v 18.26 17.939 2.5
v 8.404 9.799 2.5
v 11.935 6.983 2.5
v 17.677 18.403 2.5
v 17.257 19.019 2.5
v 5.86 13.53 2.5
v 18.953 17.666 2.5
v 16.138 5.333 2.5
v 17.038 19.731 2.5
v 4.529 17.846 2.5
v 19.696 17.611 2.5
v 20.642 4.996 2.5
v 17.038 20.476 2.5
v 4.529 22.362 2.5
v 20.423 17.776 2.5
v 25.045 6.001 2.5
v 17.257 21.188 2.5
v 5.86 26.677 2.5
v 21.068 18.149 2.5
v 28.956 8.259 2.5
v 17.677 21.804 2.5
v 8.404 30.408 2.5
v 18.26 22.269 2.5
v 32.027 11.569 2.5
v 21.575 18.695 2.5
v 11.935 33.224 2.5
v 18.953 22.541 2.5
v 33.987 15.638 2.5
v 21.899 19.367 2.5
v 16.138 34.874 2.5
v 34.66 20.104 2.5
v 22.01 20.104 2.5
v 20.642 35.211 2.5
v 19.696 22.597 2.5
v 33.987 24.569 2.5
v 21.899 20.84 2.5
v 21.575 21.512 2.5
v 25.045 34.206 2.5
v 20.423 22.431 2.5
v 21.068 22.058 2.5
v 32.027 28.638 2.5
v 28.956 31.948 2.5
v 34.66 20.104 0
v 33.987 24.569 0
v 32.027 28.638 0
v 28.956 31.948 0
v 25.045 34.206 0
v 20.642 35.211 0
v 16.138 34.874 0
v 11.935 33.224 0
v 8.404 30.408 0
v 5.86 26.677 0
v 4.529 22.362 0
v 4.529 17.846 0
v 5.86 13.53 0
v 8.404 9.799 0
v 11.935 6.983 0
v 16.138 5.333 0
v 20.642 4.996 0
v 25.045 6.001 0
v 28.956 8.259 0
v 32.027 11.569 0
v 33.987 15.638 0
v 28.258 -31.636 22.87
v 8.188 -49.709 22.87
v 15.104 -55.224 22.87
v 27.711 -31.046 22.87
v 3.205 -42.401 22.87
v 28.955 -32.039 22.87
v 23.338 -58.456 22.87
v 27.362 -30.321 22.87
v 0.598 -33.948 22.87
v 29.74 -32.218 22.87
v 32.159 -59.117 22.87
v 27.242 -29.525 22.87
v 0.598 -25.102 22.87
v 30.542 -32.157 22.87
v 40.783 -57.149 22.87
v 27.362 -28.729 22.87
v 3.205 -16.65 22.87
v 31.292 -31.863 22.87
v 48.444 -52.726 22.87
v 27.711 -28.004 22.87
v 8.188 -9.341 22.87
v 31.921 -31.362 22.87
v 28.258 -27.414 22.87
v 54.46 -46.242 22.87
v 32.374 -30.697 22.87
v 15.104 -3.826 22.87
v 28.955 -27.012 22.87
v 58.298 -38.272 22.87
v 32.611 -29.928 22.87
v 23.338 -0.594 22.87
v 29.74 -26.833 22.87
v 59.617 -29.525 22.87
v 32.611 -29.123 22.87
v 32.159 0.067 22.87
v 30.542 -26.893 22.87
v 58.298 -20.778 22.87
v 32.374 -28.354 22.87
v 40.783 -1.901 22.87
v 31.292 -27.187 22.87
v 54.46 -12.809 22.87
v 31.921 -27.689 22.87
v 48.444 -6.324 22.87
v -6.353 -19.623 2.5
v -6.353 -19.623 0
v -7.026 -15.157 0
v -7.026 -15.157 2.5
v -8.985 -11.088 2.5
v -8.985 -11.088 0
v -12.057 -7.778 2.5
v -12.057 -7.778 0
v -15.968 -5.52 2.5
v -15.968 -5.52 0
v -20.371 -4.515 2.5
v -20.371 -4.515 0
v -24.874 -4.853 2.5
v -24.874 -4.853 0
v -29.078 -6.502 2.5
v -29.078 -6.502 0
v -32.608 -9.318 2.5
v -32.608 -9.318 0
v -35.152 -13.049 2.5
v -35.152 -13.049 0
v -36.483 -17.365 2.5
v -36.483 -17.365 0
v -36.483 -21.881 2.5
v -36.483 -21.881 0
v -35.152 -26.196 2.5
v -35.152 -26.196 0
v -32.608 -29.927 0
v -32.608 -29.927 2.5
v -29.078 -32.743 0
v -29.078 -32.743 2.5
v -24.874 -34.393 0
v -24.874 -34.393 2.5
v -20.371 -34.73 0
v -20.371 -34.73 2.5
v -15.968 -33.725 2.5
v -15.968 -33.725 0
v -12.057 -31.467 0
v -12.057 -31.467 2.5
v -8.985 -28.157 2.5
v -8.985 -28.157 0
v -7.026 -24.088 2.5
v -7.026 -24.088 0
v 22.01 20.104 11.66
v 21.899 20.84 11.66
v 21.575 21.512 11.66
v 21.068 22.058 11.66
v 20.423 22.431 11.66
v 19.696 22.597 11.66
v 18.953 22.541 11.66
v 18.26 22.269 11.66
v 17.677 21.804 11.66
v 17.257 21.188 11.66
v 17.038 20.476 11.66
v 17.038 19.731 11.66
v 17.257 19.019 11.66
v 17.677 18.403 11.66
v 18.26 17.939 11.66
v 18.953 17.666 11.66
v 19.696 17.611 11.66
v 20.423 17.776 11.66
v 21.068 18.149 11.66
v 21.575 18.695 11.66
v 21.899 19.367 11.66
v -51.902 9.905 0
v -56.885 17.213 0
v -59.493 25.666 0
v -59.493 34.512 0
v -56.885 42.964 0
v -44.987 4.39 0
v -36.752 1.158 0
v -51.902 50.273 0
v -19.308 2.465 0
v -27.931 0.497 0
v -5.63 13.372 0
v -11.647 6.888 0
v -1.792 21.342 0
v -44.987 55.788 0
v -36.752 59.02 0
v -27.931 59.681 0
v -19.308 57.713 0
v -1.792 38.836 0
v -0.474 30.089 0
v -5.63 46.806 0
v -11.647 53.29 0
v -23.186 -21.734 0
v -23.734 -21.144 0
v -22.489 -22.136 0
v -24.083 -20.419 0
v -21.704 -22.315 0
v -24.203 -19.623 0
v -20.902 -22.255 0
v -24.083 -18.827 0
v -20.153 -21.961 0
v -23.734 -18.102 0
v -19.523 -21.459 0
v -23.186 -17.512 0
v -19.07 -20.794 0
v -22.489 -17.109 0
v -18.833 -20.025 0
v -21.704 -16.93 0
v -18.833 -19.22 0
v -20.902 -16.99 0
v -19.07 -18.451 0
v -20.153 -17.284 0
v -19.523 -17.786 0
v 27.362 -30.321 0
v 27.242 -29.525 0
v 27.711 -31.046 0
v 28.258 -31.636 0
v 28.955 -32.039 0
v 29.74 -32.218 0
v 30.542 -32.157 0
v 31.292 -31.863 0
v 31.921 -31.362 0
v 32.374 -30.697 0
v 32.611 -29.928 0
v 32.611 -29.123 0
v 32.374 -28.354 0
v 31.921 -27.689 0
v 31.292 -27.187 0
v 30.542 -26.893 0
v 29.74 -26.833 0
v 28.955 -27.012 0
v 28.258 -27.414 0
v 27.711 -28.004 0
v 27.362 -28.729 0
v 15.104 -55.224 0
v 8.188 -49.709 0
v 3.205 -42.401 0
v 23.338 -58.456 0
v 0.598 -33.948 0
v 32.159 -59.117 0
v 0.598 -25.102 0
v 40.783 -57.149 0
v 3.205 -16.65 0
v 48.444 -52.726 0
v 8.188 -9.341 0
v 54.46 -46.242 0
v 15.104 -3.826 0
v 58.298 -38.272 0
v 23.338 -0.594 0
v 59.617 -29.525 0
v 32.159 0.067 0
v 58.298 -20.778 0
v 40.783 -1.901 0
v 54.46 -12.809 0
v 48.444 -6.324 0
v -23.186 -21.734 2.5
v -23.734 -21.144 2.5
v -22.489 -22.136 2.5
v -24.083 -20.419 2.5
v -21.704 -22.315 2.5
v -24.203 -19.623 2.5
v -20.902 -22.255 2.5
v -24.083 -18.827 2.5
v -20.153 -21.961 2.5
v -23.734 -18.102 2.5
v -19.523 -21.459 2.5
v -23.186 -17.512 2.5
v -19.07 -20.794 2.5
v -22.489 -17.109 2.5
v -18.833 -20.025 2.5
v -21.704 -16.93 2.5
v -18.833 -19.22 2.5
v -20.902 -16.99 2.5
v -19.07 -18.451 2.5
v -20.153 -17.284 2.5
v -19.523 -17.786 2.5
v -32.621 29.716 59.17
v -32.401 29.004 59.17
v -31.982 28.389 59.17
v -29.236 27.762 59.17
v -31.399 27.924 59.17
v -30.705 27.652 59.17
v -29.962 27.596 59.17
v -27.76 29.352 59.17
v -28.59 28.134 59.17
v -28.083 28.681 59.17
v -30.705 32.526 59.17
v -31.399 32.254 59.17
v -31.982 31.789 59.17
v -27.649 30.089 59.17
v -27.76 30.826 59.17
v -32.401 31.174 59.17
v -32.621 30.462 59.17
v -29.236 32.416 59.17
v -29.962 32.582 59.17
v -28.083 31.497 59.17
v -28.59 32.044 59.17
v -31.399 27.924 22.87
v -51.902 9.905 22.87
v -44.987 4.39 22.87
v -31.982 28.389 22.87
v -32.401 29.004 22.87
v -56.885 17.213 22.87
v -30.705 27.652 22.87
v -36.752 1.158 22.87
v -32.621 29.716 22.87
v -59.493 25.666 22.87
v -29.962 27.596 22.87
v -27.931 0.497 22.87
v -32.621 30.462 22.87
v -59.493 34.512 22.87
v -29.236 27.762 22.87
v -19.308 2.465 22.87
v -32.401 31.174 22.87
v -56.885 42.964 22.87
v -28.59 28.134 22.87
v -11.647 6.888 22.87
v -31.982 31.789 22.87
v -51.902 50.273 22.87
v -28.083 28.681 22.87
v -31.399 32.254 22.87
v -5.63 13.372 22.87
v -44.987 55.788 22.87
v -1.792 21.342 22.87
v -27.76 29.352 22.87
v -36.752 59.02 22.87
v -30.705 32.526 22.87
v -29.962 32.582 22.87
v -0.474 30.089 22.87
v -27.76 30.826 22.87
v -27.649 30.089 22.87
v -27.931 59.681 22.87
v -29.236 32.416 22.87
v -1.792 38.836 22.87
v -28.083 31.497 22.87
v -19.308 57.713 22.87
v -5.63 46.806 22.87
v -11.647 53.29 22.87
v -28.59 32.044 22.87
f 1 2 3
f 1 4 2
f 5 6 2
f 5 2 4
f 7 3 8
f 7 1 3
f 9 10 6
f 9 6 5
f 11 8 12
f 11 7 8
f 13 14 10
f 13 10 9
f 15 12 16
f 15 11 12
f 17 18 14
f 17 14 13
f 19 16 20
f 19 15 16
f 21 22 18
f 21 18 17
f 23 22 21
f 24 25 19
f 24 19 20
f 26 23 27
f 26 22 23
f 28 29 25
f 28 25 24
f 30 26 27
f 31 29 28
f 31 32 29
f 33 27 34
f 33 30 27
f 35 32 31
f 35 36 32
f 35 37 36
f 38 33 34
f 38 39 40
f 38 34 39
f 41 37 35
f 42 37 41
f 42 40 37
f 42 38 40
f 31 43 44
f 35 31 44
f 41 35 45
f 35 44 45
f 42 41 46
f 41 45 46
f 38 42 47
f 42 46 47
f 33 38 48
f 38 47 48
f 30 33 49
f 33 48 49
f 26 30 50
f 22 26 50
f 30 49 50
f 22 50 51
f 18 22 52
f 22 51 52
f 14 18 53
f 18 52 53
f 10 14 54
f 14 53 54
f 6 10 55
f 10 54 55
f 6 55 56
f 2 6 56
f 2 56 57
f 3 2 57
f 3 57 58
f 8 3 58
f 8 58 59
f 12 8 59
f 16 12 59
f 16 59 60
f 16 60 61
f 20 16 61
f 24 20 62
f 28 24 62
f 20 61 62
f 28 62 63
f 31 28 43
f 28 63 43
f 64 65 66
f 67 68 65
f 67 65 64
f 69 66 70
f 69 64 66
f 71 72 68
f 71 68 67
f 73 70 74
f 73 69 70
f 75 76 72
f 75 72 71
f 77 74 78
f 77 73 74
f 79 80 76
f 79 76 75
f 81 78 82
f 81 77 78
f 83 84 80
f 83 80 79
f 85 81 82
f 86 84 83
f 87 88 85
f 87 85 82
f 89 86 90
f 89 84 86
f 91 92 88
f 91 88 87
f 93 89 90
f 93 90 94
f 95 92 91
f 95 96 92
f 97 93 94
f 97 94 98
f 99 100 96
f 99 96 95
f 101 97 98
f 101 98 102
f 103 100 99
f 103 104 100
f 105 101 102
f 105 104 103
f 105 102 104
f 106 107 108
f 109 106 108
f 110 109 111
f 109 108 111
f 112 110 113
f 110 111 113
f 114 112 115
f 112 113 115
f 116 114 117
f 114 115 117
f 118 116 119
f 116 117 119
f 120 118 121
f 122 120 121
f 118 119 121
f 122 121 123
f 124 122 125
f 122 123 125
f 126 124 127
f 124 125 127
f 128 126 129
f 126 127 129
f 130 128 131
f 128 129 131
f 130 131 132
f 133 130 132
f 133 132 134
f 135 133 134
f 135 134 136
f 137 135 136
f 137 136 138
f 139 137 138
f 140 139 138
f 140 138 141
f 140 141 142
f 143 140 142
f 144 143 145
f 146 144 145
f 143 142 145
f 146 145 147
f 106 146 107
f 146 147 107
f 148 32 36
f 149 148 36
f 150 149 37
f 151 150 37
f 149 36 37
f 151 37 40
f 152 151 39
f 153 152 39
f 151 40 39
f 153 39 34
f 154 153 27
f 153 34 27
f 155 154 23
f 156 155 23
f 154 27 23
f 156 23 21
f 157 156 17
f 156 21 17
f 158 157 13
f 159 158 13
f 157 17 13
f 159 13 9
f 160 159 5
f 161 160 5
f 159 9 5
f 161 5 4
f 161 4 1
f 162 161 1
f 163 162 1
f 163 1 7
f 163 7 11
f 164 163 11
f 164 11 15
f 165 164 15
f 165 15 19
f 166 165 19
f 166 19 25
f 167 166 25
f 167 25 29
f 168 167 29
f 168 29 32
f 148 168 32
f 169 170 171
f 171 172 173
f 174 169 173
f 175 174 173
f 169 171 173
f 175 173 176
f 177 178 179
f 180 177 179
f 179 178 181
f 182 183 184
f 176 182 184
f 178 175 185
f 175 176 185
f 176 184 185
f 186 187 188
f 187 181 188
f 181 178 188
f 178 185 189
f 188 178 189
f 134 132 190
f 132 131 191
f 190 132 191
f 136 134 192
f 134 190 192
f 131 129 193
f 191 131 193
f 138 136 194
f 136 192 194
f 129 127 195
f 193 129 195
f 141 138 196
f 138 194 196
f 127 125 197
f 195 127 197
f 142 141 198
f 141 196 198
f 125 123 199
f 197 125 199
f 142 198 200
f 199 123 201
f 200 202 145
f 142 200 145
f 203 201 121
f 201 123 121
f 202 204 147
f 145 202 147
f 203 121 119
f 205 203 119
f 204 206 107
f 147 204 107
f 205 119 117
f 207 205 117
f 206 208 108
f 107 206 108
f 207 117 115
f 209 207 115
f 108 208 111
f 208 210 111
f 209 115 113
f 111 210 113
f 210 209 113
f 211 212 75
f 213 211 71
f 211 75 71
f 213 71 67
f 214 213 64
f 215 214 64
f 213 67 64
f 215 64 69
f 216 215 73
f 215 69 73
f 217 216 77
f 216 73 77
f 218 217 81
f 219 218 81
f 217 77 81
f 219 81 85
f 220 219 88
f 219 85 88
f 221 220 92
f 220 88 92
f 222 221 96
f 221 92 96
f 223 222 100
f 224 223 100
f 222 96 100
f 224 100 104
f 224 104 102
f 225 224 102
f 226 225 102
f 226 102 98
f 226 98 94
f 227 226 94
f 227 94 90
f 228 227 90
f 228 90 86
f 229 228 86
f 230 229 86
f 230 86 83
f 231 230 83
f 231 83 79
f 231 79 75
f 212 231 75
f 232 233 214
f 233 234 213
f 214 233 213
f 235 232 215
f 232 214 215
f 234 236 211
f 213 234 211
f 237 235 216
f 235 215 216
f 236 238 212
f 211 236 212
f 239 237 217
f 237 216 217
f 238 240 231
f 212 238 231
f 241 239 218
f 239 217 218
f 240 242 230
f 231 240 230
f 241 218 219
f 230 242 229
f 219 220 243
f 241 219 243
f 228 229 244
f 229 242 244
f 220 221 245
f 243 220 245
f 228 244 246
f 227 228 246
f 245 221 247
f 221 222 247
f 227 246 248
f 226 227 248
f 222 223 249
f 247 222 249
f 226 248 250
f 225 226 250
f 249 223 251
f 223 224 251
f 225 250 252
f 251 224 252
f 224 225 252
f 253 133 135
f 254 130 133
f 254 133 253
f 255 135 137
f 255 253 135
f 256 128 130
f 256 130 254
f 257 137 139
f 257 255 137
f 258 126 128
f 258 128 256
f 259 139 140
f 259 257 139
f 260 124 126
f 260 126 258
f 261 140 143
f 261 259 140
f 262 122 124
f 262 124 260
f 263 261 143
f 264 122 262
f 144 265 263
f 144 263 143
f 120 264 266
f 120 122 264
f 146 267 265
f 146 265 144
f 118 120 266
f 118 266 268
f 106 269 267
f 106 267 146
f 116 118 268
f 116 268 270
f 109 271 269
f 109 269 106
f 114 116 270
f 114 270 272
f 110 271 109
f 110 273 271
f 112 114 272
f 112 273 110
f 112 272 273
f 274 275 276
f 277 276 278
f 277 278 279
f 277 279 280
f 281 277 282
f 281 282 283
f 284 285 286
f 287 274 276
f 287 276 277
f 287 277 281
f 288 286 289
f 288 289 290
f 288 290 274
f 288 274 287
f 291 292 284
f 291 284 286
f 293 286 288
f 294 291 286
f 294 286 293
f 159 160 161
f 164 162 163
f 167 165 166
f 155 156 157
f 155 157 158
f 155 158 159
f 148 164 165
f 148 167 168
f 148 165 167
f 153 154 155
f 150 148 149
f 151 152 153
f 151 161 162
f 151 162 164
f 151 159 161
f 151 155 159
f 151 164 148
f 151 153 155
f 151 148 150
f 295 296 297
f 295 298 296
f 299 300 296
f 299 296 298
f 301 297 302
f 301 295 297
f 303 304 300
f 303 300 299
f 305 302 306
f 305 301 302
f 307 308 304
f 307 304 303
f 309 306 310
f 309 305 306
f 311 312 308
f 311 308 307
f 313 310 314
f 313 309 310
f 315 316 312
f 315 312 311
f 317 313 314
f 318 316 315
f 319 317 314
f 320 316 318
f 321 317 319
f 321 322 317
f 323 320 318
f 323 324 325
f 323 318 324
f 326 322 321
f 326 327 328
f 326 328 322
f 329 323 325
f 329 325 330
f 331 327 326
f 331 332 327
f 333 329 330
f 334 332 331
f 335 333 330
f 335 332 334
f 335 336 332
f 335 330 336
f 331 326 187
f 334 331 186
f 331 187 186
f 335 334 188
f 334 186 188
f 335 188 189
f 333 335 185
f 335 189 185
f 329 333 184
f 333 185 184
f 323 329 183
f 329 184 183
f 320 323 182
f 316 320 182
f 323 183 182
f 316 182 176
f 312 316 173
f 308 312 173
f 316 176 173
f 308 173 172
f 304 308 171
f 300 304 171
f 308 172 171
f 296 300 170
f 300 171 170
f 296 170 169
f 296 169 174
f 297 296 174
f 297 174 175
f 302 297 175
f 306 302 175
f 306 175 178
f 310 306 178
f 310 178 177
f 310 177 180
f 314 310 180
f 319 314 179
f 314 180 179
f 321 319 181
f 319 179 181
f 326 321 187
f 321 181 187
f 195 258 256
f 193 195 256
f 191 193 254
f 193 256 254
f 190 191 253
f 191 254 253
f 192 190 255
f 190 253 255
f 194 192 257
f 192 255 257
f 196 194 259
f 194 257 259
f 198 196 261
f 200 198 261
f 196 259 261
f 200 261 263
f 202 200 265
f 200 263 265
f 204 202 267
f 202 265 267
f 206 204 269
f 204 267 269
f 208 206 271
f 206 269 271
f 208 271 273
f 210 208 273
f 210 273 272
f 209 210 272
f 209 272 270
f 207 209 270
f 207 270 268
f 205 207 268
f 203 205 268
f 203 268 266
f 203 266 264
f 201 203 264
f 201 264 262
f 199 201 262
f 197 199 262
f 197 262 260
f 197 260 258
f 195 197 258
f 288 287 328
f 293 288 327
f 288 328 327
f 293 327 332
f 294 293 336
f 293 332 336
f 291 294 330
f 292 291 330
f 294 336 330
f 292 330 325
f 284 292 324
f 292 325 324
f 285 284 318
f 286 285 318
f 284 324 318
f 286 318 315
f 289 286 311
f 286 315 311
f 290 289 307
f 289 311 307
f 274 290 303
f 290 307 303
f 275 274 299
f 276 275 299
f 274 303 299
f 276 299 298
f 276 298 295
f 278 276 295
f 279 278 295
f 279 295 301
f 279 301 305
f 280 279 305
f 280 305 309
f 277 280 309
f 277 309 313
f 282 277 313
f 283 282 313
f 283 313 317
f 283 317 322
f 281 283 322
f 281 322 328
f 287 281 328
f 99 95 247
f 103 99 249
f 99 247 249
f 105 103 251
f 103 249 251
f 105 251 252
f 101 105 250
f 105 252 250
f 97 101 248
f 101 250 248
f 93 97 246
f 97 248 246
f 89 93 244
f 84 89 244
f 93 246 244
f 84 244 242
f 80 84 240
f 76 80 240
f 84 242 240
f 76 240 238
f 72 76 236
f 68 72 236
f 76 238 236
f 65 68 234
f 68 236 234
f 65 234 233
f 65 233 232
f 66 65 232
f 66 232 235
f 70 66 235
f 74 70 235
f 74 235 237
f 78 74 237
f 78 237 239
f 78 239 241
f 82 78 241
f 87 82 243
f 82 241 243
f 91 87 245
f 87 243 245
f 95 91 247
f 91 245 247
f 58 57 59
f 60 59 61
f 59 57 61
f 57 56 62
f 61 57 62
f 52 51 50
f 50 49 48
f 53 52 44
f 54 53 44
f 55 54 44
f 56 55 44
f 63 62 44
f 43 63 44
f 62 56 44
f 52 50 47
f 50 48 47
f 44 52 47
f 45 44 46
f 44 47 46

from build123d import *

# Parameters (mm, degrees)
F0_R     = 2.5
F1_DEPTH = 59.17
F0_R_2   = 29.675
F2_DEPTH = 22.87
F3_DEPTH = 11.66
F0_R_3   = 15.15
F4_DEPTH = 2.5
F5_DEPTH = 2.5
F6_DEPTH = 22.87
F7_D     = 5.4
F8_D     = 5.4


with BuildPart() as f1:
    # F0 (on Top) → F1 (new body)
    with BuildSketch(Plane.XY):
        with Locations((-30.1490310857, 30.088982854)):
            Circle(F0_R)
    extrude(amount=F1_DEPTH)

    # F0 (on Top) → F2 (join)
    with BuildSketch(Plane.XY):
        with Locations((-30.1490310857, 30.088982854)):
            Circle(F0_R_2)
        with Locations((-30.1490310857, 30.088982854)):
            Circle(F0_R, mode=Mode.SUBTRACT)
    extrude(amount=F2_DEPTH)


with BuildPart() as f3:
    # F0 (on Top) → F3 (new body)
    with BuildSketch(Plane.XY):
        with Locations((19.5096683294, 20.1035678638)):
            Circle(F0_R)
    extrude(amount=F3_DEPTH)

    # F0 (on Top) → F4 (join)
    with BuildSketch(Plane.XY):
        with Locations((19.5096683294, 20.1035678638)):
            Circle(F0_R_3)
        with Locations((19.5096683294, 20.1035678638)):
            Circle(F0_R, mode=Mode.SUBTRACT)
    extrude(amount=F4_DEPTH)


with BuildPart() as f5:
    # F0 (on Top) → F5 (new body)
    with BuildSketch(Plane.XY):
        with Locations((-21.5026963749, -19.6227214328)):
            Circle(F0_R_3)
    extrude(amount=F5_DEPTH)

    # F7 (through all)
    with Locations(Plane(origin=(0, 0, 0), x_dir=(1, 0, 0), z_dir=(0, 0, -1))):
        with Locations((-21.5026963749, 19.6227214328)):
            Hole(F7_D / 2)


with BuildPart() as f6:
    # F0 (on Top) → F6 (new body)
    with BuildSketch(Plane.XY):
        with Locations((29.9415523733, -29.5251703596)):
            Circle(F0_R_2)
    extrude(amount=F6_DEPTH)

    # F8 (through all)
    with Locations(Plane(origin=(0, 0, 0), x_dir=(1, 0, 0), z_dir=(0, 0, -1))):
        with Locations((29.9415523733, 29.5251703596)):
            Hole(F8_D / 2)


solid = Compound([f1.part, f3.part, f5.part, f6.part])
